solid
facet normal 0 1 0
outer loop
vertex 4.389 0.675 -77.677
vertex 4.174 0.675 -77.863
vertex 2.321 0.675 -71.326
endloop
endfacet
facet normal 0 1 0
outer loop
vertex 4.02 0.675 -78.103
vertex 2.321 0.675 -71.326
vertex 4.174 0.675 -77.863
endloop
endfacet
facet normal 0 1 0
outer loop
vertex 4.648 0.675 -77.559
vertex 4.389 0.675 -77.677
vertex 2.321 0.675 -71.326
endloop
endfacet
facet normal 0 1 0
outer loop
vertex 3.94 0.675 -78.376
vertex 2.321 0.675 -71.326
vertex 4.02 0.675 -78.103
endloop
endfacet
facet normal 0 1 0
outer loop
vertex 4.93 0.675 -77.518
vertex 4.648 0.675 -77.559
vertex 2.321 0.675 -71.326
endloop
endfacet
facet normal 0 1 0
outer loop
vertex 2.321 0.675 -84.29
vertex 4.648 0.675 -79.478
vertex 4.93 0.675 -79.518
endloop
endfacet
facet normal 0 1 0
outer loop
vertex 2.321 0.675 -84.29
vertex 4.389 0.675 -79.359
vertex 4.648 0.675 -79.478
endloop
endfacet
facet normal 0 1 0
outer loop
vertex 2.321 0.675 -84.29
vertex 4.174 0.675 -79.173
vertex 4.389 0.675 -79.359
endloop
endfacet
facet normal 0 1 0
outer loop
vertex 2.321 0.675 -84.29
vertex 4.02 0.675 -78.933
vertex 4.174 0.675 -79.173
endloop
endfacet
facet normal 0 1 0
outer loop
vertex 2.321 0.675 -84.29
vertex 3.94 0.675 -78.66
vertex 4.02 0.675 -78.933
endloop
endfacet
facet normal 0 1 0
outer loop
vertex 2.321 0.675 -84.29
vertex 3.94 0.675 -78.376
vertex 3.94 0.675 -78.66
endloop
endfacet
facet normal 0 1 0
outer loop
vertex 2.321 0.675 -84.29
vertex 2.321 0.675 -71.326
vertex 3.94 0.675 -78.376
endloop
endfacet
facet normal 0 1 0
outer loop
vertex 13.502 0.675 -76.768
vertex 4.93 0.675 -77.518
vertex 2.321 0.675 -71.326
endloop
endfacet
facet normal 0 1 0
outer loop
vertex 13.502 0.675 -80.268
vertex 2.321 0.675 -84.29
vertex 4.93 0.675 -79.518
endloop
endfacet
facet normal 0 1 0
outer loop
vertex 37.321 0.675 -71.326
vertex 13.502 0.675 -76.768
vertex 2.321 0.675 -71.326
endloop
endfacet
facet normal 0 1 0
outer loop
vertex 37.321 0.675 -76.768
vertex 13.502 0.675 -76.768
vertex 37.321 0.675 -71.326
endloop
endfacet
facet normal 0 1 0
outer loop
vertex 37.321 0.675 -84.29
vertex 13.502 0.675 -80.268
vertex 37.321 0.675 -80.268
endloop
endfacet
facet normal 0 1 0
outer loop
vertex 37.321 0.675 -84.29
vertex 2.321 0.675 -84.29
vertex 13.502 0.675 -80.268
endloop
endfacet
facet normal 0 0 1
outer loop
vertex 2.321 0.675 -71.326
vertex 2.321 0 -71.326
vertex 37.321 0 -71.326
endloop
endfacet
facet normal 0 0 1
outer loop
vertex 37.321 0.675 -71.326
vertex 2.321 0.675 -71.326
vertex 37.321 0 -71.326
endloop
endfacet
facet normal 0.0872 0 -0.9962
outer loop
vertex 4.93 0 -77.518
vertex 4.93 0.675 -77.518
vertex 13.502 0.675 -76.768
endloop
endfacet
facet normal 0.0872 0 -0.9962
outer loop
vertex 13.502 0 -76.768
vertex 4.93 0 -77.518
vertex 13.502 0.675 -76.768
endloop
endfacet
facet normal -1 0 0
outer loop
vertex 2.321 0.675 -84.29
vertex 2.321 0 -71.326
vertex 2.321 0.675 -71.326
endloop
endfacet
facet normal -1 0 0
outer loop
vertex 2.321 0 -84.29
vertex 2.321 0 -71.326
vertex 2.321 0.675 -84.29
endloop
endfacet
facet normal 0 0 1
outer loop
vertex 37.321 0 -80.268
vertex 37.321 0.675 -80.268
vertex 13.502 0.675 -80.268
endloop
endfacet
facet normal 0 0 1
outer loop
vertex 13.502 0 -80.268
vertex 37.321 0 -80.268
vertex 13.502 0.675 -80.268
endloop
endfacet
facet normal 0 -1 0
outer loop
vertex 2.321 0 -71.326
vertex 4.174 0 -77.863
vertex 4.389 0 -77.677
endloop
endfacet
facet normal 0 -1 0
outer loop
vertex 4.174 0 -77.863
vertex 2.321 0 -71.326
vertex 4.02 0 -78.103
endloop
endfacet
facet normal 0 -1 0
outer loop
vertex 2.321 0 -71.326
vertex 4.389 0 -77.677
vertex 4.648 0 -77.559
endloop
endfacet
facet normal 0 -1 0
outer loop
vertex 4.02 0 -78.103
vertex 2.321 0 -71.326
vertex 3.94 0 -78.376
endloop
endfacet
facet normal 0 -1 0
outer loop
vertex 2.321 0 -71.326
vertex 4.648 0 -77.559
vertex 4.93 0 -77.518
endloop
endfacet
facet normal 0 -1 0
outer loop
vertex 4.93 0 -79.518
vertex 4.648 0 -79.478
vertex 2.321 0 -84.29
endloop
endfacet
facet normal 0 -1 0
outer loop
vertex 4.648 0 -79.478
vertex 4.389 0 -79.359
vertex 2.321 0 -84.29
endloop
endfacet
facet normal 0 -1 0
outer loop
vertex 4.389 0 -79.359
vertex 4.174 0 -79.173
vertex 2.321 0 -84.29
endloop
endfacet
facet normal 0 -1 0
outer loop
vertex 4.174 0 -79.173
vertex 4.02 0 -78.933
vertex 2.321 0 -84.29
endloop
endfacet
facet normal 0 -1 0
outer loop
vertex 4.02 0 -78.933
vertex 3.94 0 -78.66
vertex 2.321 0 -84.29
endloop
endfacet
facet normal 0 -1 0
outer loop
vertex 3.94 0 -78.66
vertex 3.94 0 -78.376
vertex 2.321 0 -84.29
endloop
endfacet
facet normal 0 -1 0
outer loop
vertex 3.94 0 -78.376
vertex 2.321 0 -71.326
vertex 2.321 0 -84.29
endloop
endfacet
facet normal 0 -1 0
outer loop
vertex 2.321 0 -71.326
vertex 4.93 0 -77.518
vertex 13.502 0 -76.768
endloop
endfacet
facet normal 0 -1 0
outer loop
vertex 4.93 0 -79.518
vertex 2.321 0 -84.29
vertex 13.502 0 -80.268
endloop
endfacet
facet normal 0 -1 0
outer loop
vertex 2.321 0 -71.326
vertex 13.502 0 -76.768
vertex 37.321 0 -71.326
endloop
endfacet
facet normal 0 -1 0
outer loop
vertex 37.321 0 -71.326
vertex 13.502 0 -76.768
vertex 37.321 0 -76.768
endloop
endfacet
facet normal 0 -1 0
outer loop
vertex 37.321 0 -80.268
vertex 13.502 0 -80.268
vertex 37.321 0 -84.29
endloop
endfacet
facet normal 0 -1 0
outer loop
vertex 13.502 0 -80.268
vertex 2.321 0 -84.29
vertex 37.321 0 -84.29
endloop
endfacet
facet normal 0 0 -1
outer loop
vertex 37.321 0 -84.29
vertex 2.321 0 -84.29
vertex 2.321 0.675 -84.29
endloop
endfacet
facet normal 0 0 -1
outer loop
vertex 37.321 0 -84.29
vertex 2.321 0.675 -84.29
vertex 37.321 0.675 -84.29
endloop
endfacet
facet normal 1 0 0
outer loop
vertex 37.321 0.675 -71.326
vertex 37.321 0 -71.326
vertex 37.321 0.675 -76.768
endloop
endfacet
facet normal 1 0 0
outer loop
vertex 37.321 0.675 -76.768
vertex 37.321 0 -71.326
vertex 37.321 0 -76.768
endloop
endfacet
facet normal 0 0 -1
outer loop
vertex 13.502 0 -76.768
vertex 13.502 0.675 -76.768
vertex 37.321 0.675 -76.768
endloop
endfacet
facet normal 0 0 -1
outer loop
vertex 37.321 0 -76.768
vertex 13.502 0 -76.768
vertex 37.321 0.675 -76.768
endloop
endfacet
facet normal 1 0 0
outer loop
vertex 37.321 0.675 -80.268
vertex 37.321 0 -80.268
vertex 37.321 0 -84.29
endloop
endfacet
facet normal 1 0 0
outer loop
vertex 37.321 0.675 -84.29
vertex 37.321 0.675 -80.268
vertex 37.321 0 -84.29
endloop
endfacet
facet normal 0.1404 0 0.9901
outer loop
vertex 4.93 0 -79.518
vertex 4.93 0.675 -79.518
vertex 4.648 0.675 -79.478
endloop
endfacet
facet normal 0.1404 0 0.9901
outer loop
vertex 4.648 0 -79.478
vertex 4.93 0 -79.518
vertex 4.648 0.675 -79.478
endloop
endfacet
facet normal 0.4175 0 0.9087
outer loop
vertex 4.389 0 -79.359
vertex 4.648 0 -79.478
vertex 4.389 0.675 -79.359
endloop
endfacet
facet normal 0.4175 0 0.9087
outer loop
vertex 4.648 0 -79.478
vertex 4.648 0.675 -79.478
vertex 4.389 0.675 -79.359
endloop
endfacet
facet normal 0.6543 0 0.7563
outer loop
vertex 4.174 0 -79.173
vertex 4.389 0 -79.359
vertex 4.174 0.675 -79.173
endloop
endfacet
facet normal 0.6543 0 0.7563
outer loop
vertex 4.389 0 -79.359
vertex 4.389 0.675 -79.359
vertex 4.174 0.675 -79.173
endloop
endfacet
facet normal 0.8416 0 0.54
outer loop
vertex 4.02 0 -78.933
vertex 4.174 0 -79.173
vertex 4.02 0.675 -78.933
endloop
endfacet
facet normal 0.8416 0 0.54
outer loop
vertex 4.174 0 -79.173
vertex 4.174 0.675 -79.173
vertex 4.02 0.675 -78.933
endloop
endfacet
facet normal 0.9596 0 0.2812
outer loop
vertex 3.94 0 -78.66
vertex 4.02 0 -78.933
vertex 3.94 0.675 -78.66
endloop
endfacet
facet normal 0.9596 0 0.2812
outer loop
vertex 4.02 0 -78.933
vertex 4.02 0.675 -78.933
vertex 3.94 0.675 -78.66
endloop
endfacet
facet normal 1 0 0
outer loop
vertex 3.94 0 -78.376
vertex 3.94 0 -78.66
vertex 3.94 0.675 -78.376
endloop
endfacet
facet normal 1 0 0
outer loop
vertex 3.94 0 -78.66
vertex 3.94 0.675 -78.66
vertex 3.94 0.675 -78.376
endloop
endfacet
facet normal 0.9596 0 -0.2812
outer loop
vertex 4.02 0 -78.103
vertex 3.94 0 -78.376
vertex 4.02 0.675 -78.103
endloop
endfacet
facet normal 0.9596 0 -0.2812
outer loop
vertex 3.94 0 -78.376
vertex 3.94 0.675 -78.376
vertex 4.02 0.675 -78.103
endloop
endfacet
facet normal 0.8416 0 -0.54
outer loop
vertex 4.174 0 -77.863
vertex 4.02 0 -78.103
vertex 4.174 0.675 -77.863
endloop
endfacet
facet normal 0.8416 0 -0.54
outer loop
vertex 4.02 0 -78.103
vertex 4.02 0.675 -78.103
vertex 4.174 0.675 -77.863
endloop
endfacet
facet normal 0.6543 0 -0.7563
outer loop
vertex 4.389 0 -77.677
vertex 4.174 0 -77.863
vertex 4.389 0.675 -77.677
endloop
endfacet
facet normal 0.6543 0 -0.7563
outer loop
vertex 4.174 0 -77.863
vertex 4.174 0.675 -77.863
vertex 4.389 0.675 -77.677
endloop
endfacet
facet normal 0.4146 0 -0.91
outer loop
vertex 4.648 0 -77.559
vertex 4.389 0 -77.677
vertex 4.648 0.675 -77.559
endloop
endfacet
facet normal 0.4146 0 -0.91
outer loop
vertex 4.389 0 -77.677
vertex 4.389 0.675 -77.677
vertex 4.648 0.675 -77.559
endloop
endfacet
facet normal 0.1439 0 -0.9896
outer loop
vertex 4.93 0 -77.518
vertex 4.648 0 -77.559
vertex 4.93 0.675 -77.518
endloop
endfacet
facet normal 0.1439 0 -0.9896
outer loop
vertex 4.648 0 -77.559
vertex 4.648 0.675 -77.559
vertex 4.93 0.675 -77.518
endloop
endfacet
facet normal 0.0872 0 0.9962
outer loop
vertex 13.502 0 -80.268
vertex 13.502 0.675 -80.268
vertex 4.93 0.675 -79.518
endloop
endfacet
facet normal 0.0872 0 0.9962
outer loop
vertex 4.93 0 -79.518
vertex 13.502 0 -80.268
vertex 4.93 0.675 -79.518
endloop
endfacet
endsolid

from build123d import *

# Parameters (mm, degrees)
SKETCH1_W           = 35
SKETCH1_H           = 12.964307825
BOSS_EXTRUDE1_DEPTH = 0.675
CUT_EXTRUDE1_DEPTH  = 0.68


with BuildPart() as part:
    # Sketch1 → Boss-Extrude1 (new body)
    with BuildSketch(Plane(origin=(0, 0, 0), x_dir=(1, 0, 0), z_dir=(0, 1, 0))):
        with Locations((19.821319384, 77.80811632)):
            Rectangle(SKETCH1_W, SKETCH1_H)
    extrude(amount=BOSS_EXTRUDE1_DEPTH)

    # Sketch2 → Cut-Extrude1 (cut)
    with BuildSketch(Plane(origin=(0, 0.675, 0), x_dir=(1, 0, 0), z_dir=(0, 1, 0))):
        with BuildLine():
            Line((13.502454123, 76.768011208), (37.321319384, 76.768011208))
            Line((37.321319384, 76.768011208), (37.321319384, 78.518011208))
            Line((37.321319384, 78.518011208), (37.321319384, 80.268011208))
            Line((37.321319384, 80.268011208), (13.502454123, 80.268011208))
            Line((13.502454123, 80.268011208), (4.929914896, 79.518011208))
            ThreePointArc((4.929914896, 79.518011208), (3.929914896, 78.518011208), (4.929914896, 77.518011208))
            Line((4.929914896, 77.518011208), (13.502454123, 76.768011208))
        make_face()
    extrude(amount=-CUT_EXTRUDE1_DEPTH, mode=Mode.SUBTRACT)


solid = part.part
